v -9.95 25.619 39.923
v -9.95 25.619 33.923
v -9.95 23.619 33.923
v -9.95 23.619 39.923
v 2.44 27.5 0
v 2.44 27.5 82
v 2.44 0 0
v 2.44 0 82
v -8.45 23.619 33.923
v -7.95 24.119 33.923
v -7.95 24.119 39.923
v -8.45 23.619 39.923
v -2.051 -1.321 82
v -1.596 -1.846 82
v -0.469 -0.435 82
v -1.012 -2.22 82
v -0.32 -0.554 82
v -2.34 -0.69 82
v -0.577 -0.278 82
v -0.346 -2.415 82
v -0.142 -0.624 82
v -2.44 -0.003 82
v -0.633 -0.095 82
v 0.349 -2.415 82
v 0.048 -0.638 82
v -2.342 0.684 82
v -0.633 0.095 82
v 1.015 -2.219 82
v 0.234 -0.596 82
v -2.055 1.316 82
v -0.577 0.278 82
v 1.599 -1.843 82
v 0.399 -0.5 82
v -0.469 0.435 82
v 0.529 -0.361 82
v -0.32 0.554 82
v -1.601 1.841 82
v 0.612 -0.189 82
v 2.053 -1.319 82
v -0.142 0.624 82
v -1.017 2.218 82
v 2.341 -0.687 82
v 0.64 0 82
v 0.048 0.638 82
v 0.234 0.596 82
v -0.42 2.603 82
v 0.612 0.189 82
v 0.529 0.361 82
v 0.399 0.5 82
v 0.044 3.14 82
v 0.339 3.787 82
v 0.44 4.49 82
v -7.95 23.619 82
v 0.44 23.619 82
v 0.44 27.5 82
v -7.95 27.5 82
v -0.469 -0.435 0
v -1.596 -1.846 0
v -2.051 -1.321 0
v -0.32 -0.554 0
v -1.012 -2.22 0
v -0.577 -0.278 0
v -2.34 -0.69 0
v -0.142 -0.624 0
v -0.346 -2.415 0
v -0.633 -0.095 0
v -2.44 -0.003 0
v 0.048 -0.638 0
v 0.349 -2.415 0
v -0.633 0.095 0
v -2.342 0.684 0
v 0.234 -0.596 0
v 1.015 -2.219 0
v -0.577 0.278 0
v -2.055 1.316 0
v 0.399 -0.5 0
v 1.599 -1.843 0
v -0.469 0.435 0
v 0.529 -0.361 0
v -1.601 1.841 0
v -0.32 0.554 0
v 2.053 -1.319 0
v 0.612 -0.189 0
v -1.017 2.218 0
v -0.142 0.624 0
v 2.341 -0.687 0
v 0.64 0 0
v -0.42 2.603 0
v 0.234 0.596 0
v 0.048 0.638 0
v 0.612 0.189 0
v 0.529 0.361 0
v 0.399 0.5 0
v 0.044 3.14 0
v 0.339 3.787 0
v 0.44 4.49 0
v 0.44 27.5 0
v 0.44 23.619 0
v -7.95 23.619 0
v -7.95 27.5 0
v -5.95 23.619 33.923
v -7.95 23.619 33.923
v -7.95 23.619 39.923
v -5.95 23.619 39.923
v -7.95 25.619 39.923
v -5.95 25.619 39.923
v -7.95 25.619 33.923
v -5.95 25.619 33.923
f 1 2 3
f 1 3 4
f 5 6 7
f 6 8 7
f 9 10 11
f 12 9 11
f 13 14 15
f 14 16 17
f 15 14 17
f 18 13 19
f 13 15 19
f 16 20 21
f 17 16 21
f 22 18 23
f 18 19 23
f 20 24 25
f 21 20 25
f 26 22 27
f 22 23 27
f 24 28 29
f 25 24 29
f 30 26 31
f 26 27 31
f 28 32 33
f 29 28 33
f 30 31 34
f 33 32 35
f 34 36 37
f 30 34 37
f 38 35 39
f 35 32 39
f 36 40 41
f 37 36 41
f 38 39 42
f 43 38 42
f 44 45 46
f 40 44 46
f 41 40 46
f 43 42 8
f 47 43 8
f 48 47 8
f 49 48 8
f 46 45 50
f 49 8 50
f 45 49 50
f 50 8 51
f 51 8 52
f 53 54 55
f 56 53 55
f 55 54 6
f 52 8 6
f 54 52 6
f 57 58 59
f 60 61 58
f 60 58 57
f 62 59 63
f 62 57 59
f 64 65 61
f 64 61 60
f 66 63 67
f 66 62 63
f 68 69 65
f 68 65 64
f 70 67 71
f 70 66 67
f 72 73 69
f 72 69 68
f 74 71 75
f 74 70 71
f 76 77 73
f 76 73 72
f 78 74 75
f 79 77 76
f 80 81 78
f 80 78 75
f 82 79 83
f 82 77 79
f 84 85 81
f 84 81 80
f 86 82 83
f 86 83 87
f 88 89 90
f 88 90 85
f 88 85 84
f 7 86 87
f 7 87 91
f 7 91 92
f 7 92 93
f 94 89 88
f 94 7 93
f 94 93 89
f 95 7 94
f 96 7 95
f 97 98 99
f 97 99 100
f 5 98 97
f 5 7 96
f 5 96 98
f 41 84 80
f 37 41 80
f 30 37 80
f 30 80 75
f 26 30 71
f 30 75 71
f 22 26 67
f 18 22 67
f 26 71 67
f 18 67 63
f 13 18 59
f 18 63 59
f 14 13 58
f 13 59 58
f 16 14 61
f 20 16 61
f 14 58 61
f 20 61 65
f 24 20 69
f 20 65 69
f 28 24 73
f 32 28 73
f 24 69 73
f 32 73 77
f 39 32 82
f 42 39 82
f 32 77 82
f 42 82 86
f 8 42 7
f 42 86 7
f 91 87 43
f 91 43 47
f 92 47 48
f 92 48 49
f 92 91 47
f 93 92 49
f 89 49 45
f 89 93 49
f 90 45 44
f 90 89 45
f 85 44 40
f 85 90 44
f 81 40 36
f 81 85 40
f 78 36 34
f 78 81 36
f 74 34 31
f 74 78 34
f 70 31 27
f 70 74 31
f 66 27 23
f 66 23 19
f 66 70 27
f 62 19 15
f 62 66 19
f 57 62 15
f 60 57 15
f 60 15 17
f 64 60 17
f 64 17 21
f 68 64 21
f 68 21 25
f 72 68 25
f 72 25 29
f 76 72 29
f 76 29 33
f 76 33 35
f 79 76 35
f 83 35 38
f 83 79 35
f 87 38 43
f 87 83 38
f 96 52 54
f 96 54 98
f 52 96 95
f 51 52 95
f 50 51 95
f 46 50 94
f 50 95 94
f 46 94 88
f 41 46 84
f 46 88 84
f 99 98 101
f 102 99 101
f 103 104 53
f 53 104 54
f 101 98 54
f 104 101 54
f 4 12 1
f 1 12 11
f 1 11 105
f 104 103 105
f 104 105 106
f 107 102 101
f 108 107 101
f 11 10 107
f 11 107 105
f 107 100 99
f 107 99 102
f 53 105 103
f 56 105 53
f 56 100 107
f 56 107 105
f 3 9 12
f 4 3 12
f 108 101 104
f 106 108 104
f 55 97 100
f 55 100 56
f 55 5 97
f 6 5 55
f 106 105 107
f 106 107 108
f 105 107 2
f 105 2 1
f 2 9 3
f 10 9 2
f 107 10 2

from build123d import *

# Parameters (mm, degrees)
SKETCH1_R           = 0.64
BOSS_EXTRUDE1_DEPTH = 82
SKETCH3_W           = 2
SKETCH3_H           = 82
BOSS_EXTRUDE4_DEPTH = 2.5
SKETCH6_W           = 82
SKETCH6_H           = 3.880734095
BOSS_EXTRUDE5_DEPTH = 8.39
SKETCH27_W          = 6
SKETCH27_H          = 2
BOSS_EXTRUDE6_DEPTH = 2
SKETCH26_W          = 2
SKETCH26_H          = 6
CUT_EXTRUDE2_DEPTH  = 2
CHAMFER1_SIZE       = 0.5


with BuildPart() as part:
    # Sketch1 → Boss-Extrude1 (new body)
    with BuildSketch(Plane.XY):
        with BuildLine():
            Line((2.44, 0), (2.44, 25))
            Line((2.44, 25), (0.44, 25))
            Line((0.44, 25), (0.44, 4.489988864))
            ThreePointArc((0.44, 4.489988864), (0.044314057, 3.140225052), (-1.017489879, 2.217727293))
            ThreePointArc((-1.017489879, 2.217727293), (-1.317369481, -2.05381052), (2.44, 0))
        make_face()
        Circle(SKETCH1_R, mode=Mode.SUBTRACT)
    extrude(amount=BOSS_EXTRUDE1_DEPTH)

    # Sketch3 → Boss-Extrude4 (add)
    with BuildSketch(Plane(origin=(0, 25, 0), x_dir=(1, 0, 0), z_dir=(0, 1, 0))):
        with Locations((1.44, -41)):
            Rectangle(SKETCH3_W, SKETCH3_H)
    extrude(amount=BOSS_EXTRUDE4_DEPTH)

    # Sketch6 → Boss-Extrude5 (add)
    with BuildSketch(Plane.ZY.offset(-0.44)):
        with Locations((41, 25.559632953)):
            Rectangle(SKETCH6_W, SKETCH6_H)
    extrude(amount=BOSS_EXTRUDE5_DEPTH)

    # Sketch27 → Boss-Extrude6 (add)
    with BuildSketch(Plane.ZY.offset(7.95)):
        with Locations((36.92283214, 24.619265905)):
            Rectangle(SKETCH27_W, SKETCH27_H)
    extrude(amount=BOSS_EXTRUDE6_DEPTH)

    # Sketch26 → Cut-Extrude2 (cut)
    with BuildSketch(Plane.XZ.offset(-23.619265905)):
        with Locations((-6.95, 36.92283214)):
            Rectangle(SKETCH26_W, SKETCH26_H)
    extrude(amount=-CUT_EXTRUDE2_DEPTH, mode=Mode.SUBTRACT)


with BuildPart() as cut_extrude2_piece_1:
    # of the separate pieces the step leaves, piece 1, a body of its own (cut_extrude2_pieces)
    add(part.part.solids().sort_by_distance((2.44, 0, 0))[0])


with BuildPart() as cut_extrude2_piece_2:
    # of the separate pieces the step leaves, piece 2, a body of its own (cut_extrude2_pieces)
    add(part.part.solids().sort_by_distance((-9.95, 25.619265905, 39.92283214))[0])

    # Chamfer1
    chamfer1_edges = [cut_extrude2_piece_2.edges().sort_by_distance(p)[0] for p in [
        (-7.95, 23.619265905, 36.92283214),
    ]]
    chamfer(chamfer1_edges, length=CHAMFER1_SIZE)


solid = Compound([cut_extrude2_piece_1.part, cut_extrude2_piece_2.part])
